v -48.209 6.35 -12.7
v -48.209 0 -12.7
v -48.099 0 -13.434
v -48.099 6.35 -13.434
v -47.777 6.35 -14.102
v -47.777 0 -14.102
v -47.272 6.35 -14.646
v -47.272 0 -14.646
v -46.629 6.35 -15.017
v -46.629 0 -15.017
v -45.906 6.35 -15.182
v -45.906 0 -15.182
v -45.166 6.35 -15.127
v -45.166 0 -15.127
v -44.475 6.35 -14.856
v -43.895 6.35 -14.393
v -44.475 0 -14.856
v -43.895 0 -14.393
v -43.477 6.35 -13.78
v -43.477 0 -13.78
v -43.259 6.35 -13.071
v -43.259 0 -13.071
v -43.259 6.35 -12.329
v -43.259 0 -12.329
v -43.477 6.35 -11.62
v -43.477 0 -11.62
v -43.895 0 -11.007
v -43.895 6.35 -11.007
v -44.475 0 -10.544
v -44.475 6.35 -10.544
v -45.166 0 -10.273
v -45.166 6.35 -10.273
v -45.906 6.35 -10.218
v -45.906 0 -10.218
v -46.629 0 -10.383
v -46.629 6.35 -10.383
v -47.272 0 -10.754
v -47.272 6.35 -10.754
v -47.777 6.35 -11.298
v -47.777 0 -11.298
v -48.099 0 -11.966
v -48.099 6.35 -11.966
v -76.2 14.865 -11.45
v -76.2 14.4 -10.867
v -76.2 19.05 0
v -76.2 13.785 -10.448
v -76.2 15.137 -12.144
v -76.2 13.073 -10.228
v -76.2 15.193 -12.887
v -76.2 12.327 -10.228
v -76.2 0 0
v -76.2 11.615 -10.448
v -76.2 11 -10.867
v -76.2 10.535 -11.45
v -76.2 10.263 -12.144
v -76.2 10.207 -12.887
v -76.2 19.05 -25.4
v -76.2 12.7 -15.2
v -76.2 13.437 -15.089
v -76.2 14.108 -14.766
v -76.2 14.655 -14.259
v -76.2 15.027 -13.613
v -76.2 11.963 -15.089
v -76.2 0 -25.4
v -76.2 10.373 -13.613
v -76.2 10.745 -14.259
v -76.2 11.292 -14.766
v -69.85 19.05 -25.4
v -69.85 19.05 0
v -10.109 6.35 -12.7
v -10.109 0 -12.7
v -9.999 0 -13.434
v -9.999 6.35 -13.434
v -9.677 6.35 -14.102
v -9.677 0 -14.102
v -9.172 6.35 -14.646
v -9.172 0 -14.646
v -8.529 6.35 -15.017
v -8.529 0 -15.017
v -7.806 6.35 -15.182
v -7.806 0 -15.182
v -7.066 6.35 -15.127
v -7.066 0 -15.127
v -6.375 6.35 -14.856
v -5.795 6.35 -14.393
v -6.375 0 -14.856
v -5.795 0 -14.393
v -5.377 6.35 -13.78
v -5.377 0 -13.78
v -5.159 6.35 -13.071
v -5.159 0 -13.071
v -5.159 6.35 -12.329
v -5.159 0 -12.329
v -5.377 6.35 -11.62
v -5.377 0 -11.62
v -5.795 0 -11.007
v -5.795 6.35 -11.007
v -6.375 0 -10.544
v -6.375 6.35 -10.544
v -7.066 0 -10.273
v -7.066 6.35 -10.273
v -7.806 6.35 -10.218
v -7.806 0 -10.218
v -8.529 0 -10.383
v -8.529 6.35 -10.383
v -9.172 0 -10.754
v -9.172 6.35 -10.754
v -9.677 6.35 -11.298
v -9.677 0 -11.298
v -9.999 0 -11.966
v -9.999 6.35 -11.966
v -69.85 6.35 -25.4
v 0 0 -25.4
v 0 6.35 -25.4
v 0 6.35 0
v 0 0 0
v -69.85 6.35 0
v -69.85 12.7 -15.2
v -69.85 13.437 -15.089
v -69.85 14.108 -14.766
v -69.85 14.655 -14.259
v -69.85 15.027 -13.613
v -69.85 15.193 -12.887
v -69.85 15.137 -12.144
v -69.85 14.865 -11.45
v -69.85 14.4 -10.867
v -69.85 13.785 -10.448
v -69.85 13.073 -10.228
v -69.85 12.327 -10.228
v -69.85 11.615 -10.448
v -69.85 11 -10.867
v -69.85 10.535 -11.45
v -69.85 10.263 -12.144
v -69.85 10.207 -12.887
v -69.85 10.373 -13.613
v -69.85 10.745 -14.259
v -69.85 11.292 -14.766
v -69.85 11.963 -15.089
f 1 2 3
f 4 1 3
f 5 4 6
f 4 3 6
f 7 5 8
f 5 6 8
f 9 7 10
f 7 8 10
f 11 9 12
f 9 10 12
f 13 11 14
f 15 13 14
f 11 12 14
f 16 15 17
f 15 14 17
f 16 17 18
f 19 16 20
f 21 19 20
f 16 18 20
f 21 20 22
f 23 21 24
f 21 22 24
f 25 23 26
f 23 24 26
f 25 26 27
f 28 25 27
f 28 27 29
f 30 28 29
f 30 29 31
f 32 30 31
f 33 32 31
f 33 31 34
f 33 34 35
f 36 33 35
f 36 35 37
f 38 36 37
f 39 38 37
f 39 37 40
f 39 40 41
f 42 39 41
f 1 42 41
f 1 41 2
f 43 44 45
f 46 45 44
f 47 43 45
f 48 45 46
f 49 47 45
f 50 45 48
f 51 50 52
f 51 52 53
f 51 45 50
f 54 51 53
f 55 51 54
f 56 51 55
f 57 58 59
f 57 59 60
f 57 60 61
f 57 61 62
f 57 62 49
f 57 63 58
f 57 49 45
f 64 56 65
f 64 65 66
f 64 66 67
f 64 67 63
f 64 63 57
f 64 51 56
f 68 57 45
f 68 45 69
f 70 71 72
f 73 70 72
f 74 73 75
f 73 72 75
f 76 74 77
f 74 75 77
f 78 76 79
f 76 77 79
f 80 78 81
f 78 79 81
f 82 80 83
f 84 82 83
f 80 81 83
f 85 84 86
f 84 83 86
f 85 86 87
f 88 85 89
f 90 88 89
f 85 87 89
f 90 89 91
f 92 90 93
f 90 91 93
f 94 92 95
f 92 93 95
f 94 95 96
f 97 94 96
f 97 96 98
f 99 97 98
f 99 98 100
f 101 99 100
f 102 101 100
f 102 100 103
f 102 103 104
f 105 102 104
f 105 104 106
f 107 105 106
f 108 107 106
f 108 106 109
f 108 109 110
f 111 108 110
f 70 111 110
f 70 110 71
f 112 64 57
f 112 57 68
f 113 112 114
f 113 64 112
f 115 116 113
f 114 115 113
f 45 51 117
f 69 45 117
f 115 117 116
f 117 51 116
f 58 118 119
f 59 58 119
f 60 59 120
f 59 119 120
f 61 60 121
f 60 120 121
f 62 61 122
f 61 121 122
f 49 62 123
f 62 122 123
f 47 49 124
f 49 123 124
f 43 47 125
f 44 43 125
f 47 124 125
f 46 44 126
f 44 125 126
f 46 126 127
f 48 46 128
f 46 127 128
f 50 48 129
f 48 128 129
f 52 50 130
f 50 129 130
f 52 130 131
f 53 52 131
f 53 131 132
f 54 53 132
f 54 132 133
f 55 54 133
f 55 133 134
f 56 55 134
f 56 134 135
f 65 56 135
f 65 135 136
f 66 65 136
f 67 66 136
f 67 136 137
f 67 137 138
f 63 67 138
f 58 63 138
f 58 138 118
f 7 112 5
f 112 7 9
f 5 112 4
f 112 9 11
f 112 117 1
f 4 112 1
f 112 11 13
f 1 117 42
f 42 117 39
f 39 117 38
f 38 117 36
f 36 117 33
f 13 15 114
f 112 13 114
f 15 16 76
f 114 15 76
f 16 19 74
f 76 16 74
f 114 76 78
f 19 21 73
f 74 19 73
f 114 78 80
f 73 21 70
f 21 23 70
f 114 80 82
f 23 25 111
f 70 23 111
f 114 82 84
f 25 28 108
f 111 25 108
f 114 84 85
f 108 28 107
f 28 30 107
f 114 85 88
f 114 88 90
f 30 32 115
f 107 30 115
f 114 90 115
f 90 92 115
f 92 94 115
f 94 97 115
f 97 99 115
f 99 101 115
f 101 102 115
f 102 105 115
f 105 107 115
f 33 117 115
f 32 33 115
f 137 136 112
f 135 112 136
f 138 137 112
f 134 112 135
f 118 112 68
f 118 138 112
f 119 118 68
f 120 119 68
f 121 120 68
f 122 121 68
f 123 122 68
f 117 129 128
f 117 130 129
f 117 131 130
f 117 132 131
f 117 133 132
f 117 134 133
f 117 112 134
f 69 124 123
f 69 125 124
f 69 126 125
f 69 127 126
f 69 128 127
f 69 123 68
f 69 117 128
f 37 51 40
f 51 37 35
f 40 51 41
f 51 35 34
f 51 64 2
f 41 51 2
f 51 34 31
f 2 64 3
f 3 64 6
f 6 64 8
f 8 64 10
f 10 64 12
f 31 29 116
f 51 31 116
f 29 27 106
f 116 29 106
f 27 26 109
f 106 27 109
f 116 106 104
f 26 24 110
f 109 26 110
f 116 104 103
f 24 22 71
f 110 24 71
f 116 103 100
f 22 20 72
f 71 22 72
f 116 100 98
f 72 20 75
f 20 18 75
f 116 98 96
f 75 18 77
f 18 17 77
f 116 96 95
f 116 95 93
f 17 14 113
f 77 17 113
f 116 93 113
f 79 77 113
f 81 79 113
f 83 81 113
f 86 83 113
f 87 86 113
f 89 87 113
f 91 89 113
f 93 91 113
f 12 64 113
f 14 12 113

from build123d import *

# Parameters (mm, degrees)
SKETCH1_W                  = 76.2
SKETCH1_H                  = 25.4
BOSS_EXTRUDE1_DEPTH        = 19.05
SKETCH2_W                  = 69.85
SKETCH2_H                  = 12.7
CUT_EXTRUDE1_DEPTH         = 83.55
M6X1_0_TAPPED_HOLE1_D      = 5
F_9_0_196_DIAMETER_HOLE1_D = 4.9784


with BuildPart() as part:
    # Sketch1 → Boss-Extrude1 (new body)
    with BuildSketch(Plane(origin=(0, 0, 0), x_dir=(1, 0, 0), z_dir=(0, 1, 0))):
        with Locations((-38.1, 12.7)):
            Rectangle(SKETCH1_W, SKETCH1_H)
    extrude(amount=BOSS_EXTRUDE1_DEPTH)

    # Sketch2 → Cut-Extrude1 (cut, through all)
    with BuildSketch(Plane.XY):
        with Locations((-34.925, 12.7)):
            Rectangle(SKETCH2_W, SKETCH2_H)
    extrude(amount=-CUT_EXTRUDE1_DEPTH, mode=Mode.SUBTRACT)

    # M6x1.0 Tapped Hole1 (through all)
    with Locations(Plane.ZY.offset(76.2)):
        with Locations((-12.7, 12.7)):
            Hole(M6X1_0_TAPPED_HOLE1_D / 2)

    # #9 (0.196) Diameter Hole1 (through all)
    with Locations(Plane(origin=(0, 6.35, 0), x_dir=(1, 0, 0), z_dir=(0, 1, 0))):
        with Locations((-45.72, 12.7), (-7.62, 12.7)):
            Hole(F_9_0_196_DIAMETER_HOLE1_D / 2)


solid = part.part
